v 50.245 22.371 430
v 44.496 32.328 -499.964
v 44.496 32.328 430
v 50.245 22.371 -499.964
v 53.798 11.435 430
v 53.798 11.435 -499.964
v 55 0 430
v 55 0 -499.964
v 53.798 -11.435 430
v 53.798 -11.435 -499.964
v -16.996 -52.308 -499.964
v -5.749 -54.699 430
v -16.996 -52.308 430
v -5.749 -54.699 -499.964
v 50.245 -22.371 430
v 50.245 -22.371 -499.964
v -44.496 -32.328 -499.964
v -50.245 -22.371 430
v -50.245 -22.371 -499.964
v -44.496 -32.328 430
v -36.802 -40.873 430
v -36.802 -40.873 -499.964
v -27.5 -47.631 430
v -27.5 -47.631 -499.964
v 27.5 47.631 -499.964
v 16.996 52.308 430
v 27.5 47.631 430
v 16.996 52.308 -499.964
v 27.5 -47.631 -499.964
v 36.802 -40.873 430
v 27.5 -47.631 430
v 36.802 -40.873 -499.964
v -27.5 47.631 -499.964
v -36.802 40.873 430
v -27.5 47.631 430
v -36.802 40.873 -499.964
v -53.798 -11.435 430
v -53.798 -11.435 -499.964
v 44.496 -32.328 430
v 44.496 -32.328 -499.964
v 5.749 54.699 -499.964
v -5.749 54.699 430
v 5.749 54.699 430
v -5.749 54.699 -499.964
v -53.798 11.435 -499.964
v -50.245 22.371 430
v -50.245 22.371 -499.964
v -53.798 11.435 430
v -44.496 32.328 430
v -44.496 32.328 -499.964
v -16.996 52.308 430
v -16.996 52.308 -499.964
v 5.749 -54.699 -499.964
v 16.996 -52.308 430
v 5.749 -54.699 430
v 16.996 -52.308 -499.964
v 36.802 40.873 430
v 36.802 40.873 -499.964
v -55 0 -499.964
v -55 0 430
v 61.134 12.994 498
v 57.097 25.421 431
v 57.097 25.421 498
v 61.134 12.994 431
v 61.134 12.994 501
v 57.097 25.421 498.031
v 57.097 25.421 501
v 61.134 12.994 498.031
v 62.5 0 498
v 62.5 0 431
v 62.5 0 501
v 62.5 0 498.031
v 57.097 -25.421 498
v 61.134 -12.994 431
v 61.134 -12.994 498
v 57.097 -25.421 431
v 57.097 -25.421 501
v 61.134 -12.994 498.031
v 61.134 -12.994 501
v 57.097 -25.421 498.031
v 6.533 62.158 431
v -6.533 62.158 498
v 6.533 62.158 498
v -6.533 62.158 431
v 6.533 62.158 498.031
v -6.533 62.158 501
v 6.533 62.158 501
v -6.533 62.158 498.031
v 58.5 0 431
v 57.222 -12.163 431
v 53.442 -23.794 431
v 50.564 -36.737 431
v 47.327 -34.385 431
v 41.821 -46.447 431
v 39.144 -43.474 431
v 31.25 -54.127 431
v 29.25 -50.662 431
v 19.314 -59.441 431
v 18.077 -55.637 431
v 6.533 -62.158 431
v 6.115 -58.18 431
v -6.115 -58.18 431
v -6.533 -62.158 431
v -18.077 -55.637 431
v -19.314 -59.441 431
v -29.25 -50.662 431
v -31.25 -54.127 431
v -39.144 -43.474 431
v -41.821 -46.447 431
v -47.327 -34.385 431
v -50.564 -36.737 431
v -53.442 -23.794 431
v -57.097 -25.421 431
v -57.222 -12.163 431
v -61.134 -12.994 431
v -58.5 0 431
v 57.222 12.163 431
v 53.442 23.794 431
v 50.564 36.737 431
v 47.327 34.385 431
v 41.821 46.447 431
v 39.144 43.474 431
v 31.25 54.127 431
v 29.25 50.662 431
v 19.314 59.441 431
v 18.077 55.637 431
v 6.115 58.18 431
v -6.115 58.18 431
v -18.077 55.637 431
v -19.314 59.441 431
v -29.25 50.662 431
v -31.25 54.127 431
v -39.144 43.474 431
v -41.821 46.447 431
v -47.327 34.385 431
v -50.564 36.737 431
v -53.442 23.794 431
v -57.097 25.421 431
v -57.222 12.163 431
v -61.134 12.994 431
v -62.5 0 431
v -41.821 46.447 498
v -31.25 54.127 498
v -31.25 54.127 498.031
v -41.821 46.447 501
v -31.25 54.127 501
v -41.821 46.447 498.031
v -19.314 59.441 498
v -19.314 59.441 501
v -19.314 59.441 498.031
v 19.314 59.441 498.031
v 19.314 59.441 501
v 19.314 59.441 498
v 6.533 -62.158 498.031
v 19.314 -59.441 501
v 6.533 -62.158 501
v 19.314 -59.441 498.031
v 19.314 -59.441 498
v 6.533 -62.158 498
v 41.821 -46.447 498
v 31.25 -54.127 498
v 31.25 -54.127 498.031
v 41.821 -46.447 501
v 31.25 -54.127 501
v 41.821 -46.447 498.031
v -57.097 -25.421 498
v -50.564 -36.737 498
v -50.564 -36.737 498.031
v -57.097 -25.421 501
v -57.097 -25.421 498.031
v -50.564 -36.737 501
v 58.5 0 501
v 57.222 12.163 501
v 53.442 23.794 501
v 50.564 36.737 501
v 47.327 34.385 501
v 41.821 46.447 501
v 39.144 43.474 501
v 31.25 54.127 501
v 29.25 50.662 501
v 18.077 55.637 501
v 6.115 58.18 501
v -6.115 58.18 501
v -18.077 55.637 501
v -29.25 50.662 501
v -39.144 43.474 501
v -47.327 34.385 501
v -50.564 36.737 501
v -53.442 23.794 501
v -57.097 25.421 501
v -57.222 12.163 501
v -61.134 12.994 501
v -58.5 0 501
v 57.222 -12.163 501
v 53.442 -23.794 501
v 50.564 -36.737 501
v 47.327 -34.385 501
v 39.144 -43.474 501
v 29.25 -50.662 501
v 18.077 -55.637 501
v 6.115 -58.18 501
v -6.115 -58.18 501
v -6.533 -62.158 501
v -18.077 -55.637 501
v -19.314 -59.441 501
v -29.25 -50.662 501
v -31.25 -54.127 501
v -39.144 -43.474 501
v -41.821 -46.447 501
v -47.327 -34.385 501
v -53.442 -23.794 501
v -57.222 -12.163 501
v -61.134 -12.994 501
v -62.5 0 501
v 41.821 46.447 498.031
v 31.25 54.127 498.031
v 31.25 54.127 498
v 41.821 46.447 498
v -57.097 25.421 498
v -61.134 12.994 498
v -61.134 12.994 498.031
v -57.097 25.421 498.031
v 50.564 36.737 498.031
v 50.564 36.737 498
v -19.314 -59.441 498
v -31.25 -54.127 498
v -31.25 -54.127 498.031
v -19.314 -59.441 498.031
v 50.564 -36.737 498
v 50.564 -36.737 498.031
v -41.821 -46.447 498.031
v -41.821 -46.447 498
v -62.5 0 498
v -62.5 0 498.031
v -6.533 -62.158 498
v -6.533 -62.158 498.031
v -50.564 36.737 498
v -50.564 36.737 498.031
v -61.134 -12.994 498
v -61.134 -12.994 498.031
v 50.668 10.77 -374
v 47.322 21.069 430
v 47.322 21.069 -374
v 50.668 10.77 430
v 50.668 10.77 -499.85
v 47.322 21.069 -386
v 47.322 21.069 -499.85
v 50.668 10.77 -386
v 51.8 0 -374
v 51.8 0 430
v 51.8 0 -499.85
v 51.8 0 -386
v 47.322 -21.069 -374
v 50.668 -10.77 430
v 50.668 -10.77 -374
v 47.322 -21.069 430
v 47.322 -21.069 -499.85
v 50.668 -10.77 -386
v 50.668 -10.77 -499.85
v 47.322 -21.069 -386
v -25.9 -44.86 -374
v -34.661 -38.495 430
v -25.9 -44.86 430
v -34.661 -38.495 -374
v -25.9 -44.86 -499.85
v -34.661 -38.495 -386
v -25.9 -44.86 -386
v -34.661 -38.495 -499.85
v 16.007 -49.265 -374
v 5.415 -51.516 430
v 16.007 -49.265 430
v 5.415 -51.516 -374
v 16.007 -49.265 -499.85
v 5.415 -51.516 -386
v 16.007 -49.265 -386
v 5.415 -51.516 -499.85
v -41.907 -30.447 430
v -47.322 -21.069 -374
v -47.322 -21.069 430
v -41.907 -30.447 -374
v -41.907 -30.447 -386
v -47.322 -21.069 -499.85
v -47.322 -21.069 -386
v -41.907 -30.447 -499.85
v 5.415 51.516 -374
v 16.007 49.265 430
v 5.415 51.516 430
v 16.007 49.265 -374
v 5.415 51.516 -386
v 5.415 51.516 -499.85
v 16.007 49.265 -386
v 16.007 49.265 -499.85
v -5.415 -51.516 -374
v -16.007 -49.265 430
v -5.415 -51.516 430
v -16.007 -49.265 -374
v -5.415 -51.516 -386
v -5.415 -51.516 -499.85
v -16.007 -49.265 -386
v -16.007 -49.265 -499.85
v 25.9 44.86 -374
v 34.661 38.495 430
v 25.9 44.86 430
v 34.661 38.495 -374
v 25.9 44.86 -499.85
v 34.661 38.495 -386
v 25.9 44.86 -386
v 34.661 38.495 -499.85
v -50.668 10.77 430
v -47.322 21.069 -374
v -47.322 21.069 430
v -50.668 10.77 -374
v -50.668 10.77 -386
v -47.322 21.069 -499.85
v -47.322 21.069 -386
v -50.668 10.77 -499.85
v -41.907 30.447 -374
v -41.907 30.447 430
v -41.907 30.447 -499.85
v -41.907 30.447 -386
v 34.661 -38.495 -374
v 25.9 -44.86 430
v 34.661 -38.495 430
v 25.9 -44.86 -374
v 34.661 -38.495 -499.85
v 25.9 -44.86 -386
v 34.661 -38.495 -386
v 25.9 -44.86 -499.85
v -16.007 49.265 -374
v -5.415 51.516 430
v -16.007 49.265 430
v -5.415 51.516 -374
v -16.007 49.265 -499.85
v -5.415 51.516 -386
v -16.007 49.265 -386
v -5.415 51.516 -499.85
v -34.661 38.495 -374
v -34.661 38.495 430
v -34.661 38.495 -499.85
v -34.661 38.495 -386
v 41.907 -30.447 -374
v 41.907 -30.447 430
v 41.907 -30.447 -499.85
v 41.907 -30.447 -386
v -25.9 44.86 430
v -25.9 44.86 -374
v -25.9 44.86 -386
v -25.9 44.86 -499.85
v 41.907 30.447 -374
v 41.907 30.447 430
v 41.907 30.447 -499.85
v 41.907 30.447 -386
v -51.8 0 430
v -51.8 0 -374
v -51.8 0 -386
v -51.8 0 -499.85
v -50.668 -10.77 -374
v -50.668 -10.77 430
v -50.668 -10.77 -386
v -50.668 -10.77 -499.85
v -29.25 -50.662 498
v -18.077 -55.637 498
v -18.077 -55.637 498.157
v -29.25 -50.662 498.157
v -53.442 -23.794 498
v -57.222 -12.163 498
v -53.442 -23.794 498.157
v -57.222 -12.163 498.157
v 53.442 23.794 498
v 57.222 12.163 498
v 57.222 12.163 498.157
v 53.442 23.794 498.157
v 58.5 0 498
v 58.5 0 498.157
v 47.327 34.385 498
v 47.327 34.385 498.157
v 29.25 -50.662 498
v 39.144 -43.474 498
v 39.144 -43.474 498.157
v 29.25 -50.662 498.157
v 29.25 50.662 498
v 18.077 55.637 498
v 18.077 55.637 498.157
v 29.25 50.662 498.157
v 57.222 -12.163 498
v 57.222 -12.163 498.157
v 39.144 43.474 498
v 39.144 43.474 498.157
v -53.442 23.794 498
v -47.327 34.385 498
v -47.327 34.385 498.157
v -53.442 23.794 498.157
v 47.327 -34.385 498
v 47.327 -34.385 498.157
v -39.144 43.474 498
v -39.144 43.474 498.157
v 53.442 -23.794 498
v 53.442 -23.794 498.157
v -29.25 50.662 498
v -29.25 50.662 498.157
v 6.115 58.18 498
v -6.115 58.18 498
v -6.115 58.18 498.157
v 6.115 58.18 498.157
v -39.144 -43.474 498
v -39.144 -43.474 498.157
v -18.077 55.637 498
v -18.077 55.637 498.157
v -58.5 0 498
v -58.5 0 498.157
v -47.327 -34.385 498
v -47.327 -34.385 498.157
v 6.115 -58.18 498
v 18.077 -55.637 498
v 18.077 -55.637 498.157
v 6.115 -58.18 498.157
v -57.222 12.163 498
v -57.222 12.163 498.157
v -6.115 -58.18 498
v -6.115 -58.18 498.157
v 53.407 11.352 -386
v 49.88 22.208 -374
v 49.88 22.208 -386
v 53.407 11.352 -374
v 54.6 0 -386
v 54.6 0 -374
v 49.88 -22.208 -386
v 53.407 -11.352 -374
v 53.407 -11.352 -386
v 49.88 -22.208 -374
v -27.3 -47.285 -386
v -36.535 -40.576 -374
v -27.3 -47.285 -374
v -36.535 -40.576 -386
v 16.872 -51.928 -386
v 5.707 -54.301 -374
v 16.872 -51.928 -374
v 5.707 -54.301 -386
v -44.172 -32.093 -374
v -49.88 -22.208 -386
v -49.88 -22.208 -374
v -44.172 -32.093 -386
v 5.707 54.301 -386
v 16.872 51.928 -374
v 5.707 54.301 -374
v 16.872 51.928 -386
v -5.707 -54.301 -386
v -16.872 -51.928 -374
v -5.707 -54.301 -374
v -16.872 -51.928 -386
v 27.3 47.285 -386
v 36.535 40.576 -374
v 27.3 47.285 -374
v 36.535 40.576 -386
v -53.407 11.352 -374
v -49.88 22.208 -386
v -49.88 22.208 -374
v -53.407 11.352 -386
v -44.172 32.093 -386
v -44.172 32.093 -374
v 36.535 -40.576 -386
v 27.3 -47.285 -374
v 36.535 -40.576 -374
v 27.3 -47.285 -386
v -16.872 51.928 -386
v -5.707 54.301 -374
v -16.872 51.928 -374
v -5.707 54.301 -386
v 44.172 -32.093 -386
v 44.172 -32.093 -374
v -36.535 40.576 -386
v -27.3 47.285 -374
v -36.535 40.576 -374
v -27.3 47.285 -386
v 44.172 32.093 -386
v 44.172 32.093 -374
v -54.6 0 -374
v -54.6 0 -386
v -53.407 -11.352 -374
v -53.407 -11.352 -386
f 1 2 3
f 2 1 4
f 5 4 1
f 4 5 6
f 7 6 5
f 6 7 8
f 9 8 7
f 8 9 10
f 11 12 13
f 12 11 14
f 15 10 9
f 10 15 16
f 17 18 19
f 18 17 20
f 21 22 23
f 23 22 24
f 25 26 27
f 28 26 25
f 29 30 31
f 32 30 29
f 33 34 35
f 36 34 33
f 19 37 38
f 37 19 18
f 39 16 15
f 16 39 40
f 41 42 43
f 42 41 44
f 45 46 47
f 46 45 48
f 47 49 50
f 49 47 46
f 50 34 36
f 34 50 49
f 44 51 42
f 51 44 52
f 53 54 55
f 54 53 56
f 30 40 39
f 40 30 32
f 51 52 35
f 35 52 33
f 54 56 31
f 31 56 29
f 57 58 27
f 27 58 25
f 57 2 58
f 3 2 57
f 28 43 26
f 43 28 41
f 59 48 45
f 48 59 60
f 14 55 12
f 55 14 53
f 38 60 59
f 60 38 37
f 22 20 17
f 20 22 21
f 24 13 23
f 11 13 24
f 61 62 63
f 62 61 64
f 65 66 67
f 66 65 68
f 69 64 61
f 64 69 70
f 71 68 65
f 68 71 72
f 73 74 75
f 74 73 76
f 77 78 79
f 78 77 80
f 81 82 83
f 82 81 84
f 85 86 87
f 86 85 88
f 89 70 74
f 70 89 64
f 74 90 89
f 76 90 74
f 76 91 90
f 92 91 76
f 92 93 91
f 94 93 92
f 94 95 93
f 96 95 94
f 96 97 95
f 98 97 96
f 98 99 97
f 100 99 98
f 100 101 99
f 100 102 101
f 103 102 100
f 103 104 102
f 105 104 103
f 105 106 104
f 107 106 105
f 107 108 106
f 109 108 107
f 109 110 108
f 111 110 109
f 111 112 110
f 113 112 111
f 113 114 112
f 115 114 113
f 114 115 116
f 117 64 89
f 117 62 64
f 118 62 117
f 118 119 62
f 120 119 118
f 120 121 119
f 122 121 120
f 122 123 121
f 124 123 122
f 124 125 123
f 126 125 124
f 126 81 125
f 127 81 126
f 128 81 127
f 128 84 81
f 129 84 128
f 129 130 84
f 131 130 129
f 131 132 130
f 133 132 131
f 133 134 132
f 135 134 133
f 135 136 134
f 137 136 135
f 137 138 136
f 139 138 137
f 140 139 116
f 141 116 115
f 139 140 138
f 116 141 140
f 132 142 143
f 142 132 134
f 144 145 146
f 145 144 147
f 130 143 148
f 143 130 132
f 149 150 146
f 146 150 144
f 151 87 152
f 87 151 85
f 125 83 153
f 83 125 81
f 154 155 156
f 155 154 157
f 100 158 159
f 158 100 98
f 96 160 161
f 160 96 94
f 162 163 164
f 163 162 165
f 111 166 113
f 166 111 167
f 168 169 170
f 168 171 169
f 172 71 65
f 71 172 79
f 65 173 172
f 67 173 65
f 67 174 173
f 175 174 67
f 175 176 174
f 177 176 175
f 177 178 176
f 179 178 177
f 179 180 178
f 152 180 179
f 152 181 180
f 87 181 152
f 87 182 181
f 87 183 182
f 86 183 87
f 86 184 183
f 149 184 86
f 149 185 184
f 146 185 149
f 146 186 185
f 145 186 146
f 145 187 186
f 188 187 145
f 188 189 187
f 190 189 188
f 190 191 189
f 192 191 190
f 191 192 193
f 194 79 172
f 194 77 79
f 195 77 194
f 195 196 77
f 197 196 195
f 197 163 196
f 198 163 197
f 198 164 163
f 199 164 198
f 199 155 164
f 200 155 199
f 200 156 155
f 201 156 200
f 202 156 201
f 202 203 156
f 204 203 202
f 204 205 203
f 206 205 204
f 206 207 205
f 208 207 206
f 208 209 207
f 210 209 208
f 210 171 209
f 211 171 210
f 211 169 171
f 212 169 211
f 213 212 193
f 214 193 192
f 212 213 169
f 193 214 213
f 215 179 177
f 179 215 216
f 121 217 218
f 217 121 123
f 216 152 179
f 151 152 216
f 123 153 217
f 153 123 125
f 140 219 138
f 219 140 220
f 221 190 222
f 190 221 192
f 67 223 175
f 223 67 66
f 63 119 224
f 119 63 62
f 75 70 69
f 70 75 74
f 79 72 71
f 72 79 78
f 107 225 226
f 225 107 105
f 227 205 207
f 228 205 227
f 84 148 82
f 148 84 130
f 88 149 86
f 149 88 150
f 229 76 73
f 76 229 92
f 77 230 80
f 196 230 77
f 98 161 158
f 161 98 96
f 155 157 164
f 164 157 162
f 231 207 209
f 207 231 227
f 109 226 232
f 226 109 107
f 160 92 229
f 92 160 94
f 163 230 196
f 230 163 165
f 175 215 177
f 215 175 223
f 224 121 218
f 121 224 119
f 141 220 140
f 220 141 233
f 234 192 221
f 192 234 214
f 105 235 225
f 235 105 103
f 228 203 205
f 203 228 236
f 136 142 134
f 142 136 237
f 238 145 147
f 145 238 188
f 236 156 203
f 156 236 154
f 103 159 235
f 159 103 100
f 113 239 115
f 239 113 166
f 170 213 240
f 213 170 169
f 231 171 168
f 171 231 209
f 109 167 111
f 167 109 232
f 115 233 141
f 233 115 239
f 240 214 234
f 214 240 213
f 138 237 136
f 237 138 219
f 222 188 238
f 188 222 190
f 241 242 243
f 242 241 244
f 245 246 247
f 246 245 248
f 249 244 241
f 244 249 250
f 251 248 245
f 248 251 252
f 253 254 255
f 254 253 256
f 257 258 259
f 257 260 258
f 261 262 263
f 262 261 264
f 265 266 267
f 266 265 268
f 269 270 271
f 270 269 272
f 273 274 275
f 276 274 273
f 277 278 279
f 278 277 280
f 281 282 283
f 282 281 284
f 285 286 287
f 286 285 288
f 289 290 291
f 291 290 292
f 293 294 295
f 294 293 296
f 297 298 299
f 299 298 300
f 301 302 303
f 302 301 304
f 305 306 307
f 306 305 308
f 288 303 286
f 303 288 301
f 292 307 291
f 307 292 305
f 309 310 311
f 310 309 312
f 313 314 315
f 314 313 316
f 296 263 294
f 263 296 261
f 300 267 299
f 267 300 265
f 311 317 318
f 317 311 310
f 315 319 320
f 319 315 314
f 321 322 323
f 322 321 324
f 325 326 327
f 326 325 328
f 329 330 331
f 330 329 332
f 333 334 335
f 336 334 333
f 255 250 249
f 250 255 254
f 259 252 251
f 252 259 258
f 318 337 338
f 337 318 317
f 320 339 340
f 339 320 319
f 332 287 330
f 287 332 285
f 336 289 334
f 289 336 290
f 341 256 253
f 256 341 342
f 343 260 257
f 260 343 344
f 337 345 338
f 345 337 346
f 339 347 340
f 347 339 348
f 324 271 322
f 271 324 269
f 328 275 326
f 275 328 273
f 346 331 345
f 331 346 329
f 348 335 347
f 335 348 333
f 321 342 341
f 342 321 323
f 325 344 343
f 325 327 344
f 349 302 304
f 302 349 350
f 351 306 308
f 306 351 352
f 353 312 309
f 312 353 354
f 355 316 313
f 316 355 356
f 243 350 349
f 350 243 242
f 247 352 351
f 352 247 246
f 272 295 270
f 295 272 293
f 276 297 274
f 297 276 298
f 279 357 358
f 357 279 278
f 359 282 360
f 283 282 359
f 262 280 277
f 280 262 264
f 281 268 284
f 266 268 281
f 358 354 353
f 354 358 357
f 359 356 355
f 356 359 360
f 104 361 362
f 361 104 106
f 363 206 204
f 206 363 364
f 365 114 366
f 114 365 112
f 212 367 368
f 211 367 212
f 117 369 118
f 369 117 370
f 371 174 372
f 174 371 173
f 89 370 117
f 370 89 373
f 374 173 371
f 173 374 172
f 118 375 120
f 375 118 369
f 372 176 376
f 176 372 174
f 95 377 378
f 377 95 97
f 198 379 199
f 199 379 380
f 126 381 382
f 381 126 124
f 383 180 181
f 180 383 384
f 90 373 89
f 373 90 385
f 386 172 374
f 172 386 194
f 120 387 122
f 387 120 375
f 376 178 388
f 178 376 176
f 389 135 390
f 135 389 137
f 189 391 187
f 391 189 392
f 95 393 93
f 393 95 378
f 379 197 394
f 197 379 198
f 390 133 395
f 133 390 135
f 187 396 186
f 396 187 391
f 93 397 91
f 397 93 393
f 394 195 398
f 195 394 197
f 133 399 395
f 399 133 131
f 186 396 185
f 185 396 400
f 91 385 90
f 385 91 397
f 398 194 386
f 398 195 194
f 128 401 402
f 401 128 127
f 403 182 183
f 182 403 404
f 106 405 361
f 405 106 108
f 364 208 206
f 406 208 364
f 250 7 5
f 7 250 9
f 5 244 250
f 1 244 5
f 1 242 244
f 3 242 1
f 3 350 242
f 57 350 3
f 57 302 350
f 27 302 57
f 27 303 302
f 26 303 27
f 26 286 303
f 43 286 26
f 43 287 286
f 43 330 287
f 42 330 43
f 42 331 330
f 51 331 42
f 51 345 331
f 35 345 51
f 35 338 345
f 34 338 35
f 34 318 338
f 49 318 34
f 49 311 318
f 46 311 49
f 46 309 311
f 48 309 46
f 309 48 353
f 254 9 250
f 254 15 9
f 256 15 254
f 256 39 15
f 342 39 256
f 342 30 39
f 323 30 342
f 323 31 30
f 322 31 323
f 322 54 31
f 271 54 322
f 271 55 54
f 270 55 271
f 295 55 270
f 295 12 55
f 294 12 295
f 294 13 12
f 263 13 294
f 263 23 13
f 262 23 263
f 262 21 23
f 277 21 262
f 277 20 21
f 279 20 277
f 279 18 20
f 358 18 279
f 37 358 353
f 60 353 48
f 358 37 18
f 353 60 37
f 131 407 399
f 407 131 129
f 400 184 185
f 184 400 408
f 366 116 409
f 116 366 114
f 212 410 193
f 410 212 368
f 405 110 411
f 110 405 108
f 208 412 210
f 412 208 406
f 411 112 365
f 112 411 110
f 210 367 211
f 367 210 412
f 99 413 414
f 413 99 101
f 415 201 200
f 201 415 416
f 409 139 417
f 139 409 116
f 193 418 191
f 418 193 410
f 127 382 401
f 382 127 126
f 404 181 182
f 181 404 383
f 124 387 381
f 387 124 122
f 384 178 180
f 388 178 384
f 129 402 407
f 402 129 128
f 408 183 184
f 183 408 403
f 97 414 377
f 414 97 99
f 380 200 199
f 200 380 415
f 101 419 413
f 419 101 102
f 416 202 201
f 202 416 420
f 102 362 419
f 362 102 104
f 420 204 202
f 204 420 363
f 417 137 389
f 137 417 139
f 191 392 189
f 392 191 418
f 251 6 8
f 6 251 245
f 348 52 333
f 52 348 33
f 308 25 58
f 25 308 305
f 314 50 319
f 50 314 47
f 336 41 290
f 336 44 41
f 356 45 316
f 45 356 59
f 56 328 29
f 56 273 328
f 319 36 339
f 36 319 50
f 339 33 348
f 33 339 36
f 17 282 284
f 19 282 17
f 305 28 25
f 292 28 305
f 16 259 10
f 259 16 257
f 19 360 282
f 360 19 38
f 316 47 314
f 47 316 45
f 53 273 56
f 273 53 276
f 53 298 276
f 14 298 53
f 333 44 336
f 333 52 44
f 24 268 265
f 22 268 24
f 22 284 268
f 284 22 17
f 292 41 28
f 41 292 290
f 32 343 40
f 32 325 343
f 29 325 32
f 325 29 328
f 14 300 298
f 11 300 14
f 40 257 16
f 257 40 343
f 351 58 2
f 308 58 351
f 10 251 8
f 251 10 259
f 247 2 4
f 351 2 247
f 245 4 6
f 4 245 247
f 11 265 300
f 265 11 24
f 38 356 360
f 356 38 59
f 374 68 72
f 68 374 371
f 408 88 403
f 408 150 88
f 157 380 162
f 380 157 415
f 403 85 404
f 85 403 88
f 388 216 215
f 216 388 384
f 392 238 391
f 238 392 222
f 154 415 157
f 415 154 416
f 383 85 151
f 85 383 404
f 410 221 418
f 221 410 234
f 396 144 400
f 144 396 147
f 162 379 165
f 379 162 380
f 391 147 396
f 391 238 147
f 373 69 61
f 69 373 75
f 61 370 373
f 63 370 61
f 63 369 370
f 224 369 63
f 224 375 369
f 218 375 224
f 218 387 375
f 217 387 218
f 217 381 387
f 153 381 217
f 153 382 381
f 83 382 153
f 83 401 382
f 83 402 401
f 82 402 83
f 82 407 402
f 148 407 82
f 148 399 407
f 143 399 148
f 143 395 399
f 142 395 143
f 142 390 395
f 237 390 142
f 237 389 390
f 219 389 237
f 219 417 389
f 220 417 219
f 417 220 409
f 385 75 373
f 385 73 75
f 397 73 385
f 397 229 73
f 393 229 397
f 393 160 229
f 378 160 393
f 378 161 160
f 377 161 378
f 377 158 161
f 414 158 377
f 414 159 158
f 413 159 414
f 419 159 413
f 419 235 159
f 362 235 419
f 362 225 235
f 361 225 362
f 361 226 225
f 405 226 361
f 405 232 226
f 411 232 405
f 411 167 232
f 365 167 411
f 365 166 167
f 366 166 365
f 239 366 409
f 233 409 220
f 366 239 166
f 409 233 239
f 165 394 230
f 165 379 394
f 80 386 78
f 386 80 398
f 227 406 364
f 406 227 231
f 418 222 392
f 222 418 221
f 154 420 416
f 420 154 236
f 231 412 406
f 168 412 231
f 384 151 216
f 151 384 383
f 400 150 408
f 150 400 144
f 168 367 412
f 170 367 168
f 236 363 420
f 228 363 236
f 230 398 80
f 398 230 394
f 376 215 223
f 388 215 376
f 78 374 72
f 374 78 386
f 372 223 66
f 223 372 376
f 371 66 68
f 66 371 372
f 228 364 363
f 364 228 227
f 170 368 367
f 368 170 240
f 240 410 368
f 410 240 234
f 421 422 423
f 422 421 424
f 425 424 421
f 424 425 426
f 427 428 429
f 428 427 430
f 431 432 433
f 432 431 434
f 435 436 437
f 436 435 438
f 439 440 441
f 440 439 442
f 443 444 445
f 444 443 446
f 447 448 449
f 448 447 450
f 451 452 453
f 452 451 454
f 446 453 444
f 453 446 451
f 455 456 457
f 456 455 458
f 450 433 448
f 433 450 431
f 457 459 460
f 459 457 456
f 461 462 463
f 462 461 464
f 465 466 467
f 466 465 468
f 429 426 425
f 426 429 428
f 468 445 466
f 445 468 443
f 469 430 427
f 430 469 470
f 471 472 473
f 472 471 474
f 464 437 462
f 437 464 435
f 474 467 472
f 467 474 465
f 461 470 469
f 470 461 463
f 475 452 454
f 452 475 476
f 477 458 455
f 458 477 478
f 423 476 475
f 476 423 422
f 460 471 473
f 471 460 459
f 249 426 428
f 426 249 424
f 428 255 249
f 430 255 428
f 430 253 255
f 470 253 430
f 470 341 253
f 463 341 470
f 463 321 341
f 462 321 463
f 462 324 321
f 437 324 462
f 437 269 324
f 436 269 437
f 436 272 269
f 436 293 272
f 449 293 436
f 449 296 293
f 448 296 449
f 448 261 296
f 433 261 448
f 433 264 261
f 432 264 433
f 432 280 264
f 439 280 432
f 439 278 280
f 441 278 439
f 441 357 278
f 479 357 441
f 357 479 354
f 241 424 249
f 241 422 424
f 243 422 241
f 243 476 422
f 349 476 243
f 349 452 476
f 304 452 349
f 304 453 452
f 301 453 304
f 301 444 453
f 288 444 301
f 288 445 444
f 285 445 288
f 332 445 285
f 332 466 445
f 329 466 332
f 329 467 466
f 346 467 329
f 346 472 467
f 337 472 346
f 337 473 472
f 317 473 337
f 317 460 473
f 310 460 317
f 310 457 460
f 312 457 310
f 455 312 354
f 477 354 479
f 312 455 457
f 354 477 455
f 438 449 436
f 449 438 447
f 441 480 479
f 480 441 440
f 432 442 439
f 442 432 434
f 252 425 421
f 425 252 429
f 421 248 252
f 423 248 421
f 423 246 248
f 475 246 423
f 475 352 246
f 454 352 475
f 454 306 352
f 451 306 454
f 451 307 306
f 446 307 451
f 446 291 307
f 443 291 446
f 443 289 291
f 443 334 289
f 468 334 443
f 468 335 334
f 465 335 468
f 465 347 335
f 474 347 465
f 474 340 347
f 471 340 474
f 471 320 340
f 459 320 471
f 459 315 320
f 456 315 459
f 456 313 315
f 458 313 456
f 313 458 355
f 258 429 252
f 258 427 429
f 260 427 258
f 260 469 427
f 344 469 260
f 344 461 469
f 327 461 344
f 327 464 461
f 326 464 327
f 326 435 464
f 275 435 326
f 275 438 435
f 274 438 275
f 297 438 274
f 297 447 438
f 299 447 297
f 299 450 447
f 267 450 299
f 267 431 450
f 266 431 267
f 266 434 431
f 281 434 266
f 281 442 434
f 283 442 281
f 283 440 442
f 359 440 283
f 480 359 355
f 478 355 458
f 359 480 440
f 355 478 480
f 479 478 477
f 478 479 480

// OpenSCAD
// Parameters
pipe_length = 1000; //[500:2000:10]
outer_diameter = 110; //[55:220:1]
wall_thickness = 3.2; //[1.6:6.4:0.1]
socket_length = 70; //[35:140:1]
socket_outer_diameter = 125; //[112:160:1]
socket_wall_thickness = 4; //[2:8:0.1]
overlap = 1; //[0.5:2:0.1]
chamfer_length = 2; //[1:6:0.5]
marking_band_width = 12; //[6:30:1]
marking_band_depth = 0.4; //[0.2:1:0.1]
marking_band_offset_from_end = 120; //[40:300:5]

// Base Shapes
module pipe_body() {
  cylinder(h=pipe_length, r=outer_diameter/2, center=true);
}

module hollow_bore() {
  cylinder(h=pipe_length + 2*overlap, r=outer_diameter/2 - wall_thickness, center=true);
}

module socket_end() {
  translate([0, 0, pipe_length/2 - socket_length/2 + overlap])
    cylinder(h=socket_length, r=socket_outer_diameter/2, center=true);
}

module socket_bore() {
  translate([0, 0, pipe_length/2 - socket_length/2 + overlap])
    cylinder(h=socket_length + 2*overlap, r=socket_outer_diameter/2 - socket_wall_thickness, center=true);
}

module chamfer_plain_end_outer_cut() {
  translate([0, 0, -pipe_length/2 + chamfer_length/2])
    cylinder(h=chamfer_length, r1=outer_diameter/2 + overlap, r2=0, center=true);
}

module chamfer_plain_end_inner_cut() {
  translate([0, 0, -pipe_length/2 + chamfer_length/2])
    cylinder(h=chamfer_length, r1=outer_diameter/2 - wall_thickness + overlap, r2=0, center=true);
}

module chamfer_socket_end_outer_cut() {
  translate([0, 0, pipe_length/2 - chamfer_length/2])
    cylinder(h=chamfer_length, r1=socket_outer_diameter/2 + overlap, r2=0, center=true);
}

module chamfer_socket_end_inner_cut() {
  translate([0, 0, pipe_length/2 - chamfer_length/2])
    cylinder(h=chamfer_length, r1=socket_outer_diameter/2 - socket_wall_thickness + overlap, r2=0, center=true);
}

module marking_band_cut() {
  translate([0, 0, -pipe_length/2 + marking_band_offset_from_end])
    cylinder(h=marking_band_width, r=outer_diameter/2 - marking_band_depth, center=true);
}

// Operations
module pipe_plus_socket_union() {
  union() {
    pipe_body();
    socket_end();
  }
}

module pipe_socket_hollowed() {
  difference() {
    pipe_plus_socket_union();
    hollow_bore();
    socket_bore();
  }
}

module pipe_with_chamfers() {
  difference() {
    pipe_socket_hollowed();
    chamfer_plain_end_outer_cut();
    chamfer_plain_end_inner_cut();
    chamfer_socket_end_outer_cut();
    chamfer_socket_end_inner_cut();
  }
}

module pipe_with_markings() {
  difference() {
    pipe_with_chamfers();
    marking_band_cut();
  }
}

// Final Output
pipe_with_markings();
